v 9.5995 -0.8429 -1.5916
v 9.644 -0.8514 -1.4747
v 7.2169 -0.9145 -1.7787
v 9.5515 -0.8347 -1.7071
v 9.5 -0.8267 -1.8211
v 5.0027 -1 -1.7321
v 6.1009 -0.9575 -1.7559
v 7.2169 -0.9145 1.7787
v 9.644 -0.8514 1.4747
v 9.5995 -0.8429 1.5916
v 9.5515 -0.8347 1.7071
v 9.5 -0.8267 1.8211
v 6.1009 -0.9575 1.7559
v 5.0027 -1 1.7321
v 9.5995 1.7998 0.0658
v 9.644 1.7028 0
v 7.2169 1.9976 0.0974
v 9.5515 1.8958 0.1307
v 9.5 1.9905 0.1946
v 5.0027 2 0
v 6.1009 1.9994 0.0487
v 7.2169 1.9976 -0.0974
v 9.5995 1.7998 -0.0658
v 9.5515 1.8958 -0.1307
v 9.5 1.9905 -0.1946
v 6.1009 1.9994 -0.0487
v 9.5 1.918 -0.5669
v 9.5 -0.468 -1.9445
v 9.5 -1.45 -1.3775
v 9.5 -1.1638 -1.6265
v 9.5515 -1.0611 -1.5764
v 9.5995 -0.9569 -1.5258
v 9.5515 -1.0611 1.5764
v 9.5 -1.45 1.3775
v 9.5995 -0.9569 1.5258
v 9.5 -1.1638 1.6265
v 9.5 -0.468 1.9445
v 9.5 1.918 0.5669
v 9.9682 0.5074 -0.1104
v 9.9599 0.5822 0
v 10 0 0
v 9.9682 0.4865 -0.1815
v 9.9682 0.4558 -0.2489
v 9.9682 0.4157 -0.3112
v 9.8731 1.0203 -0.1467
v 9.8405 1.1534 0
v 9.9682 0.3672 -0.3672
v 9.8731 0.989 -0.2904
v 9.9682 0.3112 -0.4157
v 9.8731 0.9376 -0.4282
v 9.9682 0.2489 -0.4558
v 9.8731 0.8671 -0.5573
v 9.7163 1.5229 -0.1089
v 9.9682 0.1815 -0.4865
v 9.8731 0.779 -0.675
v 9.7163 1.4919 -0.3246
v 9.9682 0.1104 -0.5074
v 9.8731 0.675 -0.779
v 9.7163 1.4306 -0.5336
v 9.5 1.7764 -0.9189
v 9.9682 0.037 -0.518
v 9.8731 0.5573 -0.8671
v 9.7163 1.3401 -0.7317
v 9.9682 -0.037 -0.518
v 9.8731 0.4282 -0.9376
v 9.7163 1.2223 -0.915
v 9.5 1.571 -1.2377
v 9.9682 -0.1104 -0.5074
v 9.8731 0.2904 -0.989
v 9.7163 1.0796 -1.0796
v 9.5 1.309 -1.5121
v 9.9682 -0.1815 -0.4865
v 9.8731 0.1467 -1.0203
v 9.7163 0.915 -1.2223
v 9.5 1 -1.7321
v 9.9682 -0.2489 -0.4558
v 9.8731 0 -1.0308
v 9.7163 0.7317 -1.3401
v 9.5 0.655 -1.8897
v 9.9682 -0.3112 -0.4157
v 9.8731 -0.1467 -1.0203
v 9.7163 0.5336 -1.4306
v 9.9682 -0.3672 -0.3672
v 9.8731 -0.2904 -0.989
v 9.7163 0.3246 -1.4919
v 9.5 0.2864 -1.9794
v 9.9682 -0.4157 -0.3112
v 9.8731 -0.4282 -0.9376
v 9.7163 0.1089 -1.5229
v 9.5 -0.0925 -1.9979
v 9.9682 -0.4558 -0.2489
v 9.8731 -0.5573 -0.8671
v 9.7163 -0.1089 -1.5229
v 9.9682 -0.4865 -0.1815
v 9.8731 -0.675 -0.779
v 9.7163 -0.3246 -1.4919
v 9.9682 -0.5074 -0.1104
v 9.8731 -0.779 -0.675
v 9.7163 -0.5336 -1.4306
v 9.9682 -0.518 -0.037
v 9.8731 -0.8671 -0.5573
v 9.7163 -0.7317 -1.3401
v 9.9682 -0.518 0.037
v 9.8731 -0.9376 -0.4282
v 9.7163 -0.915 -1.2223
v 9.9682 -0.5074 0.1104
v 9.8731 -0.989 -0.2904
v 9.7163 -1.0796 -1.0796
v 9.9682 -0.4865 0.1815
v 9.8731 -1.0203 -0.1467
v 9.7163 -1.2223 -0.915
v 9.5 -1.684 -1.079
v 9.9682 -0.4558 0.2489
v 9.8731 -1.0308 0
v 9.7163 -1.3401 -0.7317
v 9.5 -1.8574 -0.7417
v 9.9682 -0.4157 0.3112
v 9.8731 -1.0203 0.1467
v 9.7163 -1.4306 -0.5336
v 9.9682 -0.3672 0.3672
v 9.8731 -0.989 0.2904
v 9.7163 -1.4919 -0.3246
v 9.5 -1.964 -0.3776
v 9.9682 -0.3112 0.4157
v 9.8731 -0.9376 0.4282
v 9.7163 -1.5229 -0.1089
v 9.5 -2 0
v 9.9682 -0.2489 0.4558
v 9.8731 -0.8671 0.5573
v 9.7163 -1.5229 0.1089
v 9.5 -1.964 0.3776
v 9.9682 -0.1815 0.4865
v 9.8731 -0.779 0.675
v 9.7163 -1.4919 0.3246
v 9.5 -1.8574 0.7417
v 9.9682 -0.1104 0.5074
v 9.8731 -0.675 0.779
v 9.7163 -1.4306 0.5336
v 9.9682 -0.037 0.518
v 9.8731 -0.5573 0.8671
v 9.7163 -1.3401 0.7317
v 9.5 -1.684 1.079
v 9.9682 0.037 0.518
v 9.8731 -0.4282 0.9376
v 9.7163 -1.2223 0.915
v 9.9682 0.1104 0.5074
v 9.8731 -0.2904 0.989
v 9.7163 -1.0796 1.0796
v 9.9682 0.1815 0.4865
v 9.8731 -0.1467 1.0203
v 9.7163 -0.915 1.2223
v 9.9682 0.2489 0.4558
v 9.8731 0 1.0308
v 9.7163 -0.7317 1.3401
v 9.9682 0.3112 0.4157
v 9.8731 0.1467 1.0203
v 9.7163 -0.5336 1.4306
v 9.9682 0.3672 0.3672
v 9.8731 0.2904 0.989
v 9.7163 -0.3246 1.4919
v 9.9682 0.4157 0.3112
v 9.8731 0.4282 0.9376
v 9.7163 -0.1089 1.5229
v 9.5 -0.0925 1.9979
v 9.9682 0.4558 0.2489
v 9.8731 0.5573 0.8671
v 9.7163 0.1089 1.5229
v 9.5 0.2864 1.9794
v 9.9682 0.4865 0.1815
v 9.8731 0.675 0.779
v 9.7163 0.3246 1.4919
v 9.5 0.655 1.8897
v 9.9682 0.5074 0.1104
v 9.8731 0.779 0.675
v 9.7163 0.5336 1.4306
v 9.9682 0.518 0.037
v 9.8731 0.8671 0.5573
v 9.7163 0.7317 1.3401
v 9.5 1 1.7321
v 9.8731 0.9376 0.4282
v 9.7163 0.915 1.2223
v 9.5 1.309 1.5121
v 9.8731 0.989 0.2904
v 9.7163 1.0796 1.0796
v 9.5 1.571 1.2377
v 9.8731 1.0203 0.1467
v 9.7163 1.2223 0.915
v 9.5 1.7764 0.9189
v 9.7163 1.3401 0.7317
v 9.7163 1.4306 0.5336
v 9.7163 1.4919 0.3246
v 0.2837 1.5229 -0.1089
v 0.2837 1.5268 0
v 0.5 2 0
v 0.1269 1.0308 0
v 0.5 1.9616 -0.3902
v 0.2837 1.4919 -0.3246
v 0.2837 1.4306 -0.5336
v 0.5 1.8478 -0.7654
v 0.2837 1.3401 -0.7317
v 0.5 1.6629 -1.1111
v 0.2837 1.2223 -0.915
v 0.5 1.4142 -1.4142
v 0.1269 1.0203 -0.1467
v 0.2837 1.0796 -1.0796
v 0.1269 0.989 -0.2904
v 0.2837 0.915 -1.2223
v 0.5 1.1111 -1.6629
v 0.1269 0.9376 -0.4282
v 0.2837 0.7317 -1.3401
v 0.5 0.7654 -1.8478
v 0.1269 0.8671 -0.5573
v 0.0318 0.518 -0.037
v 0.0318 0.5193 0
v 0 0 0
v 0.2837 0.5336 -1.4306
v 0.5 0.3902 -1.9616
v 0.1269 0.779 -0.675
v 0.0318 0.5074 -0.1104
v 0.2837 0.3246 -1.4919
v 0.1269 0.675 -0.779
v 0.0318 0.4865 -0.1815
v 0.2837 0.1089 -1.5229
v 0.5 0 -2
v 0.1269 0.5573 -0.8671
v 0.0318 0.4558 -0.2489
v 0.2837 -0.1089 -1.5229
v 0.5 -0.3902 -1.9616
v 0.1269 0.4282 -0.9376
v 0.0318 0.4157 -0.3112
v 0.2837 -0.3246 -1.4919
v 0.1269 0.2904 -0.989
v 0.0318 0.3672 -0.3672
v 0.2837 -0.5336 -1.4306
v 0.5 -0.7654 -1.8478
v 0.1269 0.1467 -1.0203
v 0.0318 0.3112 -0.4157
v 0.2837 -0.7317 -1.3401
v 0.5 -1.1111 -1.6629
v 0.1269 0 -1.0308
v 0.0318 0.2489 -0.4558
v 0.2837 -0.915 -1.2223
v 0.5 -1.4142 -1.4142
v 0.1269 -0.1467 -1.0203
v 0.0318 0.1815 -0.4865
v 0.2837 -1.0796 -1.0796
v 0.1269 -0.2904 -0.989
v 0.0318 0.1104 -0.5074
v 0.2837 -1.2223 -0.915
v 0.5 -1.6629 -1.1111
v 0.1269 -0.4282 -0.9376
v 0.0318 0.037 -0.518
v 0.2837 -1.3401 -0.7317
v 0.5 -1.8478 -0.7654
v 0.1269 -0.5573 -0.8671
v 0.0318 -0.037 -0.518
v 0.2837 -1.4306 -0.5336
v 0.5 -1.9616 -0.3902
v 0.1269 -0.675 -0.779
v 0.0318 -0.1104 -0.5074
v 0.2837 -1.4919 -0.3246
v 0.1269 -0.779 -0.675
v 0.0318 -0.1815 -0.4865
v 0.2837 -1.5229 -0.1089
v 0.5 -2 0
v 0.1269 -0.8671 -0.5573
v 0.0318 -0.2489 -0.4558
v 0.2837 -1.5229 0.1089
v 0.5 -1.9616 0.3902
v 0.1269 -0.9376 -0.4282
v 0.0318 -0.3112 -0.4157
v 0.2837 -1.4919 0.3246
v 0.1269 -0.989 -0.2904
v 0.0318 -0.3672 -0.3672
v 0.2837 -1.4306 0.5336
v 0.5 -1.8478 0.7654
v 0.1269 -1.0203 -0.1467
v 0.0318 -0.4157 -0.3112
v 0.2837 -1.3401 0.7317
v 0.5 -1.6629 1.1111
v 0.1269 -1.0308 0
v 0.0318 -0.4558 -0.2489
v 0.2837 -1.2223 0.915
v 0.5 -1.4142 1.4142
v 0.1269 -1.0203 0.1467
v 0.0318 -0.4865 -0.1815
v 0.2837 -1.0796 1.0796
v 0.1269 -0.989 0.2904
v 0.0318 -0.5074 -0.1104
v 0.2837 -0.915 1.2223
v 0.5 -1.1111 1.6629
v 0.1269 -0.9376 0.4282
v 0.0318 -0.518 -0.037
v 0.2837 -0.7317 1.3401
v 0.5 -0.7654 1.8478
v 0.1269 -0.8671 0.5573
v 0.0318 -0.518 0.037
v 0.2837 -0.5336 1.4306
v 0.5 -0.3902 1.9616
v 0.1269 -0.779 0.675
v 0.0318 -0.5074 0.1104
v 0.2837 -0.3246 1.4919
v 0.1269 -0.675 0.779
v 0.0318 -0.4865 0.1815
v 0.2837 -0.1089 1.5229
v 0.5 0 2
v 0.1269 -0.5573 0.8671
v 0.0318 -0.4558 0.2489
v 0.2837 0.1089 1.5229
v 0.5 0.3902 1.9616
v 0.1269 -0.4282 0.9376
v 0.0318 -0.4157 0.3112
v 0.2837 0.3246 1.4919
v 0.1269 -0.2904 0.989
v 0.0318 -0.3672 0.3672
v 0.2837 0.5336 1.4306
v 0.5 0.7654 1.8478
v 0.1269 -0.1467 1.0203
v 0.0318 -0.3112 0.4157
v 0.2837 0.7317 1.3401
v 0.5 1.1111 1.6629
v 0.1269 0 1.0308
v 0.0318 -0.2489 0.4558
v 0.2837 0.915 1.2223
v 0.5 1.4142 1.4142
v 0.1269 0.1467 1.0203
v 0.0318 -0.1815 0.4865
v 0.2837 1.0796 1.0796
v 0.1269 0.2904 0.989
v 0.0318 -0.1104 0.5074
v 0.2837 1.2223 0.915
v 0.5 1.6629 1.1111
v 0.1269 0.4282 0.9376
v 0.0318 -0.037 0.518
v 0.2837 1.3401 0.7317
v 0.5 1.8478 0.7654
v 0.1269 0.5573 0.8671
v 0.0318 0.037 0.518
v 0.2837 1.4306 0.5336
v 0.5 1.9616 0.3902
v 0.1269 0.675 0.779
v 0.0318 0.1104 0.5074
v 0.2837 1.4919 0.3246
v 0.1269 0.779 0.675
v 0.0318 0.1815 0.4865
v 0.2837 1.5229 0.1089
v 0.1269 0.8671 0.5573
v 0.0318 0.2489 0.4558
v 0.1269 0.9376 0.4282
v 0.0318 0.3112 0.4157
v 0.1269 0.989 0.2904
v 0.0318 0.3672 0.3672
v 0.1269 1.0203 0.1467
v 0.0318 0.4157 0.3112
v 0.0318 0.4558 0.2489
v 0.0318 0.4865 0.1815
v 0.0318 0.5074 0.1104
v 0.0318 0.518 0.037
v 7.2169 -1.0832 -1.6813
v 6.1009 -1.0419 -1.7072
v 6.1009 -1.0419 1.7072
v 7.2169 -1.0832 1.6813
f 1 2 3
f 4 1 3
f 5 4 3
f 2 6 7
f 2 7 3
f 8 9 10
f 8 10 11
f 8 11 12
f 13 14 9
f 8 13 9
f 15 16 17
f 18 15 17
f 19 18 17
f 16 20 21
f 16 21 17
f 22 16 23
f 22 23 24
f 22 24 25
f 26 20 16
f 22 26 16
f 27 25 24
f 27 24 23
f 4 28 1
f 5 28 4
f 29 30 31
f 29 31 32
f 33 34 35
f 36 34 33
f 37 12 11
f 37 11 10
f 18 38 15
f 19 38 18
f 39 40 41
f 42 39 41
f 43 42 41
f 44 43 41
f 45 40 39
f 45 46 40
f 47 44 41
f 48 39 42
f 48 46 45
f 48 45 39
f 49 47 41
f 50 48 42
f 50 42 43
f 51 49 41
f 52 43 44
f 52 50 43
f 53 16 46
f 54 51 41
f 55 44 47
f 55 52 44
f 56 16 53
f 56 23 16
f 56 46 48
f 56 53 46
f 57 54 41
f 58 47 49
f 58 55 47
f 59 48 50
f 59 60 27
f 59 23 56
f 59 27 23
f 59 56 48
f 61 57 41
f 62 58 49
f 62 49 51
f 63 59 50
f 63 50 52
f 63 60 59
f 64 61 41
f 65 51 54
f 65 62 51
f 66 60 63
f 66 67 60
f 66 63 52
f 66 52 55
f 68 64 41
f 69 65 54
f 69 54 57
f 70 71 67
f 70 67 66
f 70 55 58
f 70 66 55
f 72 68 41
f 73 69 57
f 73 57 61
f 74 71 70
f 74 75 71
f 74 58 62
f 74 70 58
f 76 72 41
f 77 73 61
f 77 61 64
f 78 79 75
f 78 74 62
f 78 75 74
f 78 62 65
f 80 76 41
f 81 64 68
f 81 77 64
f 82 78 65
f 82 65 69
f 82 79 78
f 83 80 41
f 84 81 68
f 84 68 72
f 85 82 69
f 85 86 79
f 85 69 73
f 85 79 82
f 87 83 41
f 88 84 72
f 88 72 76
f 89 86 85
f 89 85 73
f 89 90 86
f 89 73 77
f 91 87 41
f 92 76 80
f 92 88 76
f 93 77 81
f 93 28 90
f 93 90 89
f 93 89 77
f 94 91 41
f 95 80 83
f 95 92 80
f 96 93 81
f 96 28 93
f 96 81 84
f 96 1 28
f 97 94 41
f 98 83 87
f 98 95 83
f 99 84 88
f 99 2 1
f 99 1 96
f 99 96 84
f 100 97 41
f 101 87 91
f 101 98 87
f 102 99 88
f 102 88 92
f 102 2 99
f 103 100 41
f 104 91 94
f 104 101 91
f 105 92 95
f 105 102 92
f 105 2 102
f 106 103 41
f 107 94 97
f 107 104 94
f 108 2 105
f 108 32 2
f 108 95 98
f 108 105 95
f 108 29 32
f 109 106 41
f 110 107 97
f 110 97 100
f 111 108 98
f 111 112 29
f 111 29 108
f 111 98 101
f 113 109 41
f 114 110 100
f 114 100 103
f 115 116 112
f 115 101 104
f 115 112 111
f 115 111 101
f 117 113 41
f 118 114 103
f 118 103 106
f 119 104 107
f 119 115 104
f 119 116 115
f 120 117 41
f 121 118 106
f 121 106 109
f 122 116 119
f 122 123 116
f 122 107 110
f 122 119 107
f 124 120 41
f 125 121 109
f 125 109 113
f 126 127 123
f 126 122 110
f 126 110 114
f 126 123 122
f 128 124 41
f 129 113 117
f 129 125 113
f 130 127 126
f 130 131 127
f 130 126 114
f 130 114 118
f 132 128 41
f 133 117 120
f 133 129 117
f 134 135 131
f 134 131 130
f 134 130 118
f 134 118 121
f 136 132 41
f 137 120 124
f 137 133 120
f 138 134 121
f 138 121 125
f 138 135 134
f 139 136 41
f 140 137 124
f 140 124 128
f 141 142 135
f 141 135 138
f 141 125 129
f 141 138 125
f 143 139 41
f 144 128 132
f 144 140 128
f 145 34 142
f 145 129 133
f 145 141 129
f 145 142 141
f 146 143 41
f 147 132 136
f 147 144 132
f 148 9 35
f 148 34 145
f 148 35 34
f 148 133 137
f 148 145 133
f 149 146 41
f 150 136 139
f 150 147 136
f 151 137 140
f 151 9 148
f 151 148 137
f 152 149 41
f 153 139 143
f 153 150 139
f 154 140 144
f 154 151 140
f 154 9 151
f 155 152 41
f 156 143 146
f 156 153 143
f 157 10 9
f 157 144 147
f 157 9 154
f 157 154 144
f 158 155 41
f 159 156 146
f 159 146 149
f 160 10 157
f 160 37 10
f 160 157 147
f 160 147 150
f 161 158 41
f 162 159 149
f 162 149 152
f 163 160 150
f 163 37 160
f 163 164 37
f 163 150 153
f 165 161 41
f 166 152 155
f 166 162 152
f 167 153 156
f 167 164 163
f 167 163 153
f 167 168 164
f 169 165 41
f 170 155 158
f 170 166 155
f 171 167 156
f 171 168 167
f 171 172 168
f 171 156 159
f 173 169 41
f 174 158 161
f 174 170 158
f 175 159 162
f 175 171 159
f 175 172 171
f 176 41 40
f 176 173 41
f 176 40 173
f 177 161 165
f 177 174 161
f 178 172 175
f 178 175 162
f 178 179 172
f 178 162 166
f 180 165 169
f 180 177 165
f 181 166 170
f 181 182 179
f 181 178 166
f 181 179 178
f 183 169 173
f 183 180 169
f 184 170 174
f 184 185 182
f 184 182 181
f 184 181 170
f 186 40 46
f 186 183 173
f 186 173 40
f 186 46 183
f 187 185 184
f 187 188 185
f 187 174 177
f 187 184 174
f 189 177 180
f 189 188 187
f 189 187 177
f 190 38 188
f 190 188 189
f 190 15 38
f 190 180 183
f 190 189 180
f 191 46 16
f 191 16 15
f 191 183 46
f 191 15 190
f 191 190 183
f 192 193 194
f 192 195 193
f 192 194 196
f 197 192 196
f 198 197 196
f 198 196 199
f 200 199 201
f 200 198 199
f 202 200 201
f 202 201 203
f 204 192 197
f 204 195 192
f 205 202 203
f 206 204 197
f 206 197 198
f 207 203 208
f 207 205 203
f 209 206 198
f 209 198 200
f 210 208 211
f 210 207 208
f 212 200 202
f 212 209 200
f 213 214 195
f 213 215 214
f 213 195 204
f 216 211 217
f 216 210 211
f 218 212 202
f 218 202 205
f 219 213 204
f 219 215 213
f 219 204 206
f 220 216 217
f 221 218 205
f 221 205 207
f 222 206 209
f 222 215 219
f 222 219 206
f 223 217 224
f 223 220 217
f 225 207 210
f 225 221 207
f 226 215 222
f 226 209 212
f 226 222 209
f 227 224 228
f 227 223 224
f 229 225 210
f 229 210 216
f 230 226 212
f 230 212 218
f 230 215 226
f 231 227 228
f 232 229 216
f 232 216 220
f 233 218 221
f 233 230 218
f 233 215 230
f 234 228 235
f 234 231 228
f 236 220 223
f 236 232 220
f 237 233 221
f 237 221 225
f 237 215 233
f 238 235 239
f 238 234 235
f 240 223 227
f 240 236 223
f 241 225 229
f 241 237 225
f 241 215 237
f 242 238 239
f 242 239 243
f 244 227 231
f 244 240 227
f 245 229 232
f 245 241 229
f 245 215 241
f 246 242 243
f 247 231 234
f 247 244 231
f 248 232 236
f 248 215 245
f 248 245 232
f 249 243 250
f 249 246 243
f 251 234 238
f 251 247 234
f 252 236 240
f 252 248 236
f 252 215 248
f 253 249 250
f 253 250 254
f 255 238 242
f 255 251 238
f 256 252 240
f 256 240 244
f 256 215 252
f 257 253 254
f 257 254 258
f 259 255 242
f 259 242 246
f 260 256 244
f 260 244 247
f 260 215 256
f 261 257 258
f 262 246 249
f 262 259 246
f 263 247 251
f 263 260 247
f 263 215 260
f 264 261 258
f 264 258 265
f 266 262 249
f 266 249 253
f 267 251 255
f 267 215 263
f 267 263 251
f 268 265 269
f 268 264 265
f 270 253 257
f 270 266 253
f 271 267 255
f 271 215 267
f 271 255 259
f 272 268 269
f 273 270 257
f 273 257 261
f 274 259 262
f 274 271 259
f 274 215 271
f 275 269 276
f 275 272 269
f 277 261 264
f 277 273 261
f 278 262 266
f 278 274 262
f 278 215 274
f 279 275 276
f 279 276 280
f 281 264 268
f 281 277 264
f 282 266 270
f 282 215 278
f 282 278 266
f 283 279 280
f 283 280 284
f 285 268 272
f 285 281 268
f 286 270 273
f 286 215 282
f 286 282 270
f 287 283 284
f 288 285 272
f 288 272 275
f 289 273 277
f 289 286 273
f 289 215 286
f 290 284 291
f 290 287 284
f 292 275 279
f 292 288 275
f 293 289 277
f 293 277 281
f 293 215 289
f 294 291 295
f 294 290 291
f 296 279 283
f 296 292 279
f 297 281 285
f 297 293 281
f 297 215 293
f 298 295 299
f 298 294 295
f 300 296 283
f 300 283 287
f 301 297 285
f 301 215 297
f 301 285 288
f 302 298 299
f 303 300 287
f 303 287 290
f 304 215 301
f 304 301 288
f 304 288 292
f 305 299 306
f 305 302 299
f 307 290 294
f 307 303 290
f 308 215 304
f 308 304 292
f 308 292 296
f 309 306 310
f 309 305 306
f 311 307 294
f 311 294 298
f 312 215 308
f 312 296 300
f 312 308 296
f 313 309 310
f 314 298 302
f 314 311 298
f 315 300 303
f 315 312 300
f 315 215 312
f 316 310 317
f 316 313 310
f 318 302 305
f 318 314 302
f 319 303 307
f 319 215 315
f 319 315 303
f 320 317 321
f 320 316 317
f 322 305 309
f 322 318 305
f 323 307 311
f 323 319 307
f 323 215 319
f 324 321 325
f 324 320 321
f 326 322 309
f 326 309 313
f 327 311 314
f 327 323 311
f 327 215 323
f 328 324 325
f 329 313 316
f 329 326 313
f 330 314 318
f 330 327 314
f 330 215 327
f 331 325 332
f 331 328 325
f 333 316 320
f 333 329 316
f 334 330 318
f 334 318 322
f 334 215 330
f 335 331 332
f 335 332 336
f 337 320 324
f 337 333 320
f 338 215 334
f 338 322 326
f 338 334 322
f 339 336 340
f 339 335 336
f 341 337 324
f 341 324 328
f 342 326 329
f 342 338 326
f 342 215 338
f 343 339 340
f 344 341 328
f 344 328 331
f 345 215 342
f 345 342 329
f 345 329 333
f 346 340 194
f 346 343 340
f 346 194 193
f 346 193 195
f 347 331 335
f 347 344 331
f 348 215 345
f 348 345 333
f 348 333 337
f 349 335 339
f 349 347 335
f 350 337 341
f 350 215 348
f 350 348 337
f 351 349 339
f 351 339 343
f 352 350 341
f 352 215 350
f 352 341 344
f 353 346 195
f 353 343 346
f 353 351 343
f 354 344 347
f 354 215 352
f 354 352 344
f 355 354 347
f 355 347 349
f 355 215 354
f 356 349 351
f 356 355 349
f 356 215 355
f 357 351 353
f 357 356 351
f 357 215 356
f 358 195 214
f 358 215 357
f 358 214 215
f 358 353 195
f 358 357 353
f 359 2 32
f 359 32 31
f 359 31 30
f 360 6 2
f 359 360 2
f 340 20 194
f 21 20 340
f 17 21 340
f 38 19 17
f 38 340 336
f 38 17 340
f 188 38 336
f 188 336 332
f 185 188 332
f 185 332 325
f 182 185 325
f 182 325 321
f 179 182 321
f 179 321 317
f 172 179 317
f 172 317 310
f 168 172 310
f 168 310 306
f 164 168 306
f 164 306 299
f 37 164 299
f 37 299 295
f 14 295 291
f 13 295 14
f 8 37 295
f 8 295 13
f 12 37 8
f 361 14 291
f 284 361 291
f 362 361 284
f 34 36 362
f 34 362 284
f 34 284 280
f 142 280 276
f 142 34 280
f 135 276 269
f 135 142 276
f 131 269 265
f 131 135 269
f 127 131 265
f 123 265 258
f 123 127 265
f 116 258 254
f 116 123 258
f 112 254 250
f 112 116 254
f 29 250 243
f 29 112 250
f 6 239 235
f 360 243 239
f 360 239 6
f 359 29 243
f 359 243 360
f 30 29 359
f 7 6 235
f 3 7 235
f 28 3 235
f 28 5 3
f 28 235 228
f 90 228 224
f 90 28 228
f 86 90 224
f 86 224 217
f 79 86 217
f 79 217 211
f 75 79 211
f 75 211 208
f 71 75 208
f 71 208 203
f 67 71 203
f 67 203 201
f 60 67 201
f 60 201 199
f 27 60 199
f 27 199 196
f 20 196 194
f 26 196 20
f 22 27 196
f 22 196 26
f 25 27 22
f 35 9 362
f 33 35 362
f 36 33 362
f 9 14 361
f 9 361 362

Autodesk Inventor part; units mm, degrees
ref_plane "YZ Plane" through (0, 0, 0) normal (1, 0, 0) x (0, 1, 0)
sketch "Skizze1" plane through (0, 0, 0) normal (0, 0, 1) x (1, 0, 0)
  line L0 (0, 0) -> (10, 0)
  line L1 (0.5, 2) -> (9.5, 2)
  arc A0 (0.5, 2) -> (0, 0) centre (4.25, 0) ccw
  arc A1 (10, 0) -> (9.5, 2) centre (5.75, 0) ccw
  line L2 (10, 0) -> (10, 1.68) construction
  line L3 (10, 1.68) -> (5, 2) construction
  line L4 (-12.8617, 0) -> (72.8617, 0) projected
  line L5 (0, 12.1847) -> (0, -2.0308) projected
  point P0 (5, 0)
  dimension "d0" = 4
  dimension "d1" = 10
  dimension "d2" = 3.36
  dimension "d12" = 5
  dimension "d17" = 0.5
  dimension "d18" = 0.5
revolve "Körper" add sketch "Skizze1" angle 360 about axis through (0, 0, 0) along (1, 0, 0)
ref_plane "Work Plane1" through (10, 0, 0) normal (1, 0, 0) x (0, 1, 0)
sketch "Skizze2" plane through (10, 0, 0) normal (1, 0, 0) x (0, 1, 0)
  line L0 (0, -14) -> (0, 14) projected
ref_plane "Work Plane2" through (10, 0, -10) normal (0.998, -0.0639, 0) x (0.0639, 0.998, 0)
sketch "Skizze3" plane through (10, 0, -10) normal (0.998, -0.0639, 0) x (0.0639, 0.998, 0)
  ellipse E0 centre (-0.0319, 10) end of major axis (-0.0319, 12) minor radius 1.9959 projected
  line L0 (-0.3193, 10) -> (1.6766, 10) projected
  line L1 (1.6766, 10) -> (1.9545, 10.1946)
  line L2 (1.6766, 10) -> (1.9545, 9.8054)
  arc A0 (1.9545, 9.8054) -> (1.9545, 10.1946) centre (-0.0319, 10) ccw
  dimension "d7" = 70
extrude "Nut" cut sketch "Skizze3" against normal up to next contours L2 L1 E0 picked at (1.8643, 10.0973)
pattern_circular "Nuten" count 3 over 360 about axis through (5, 0, 0) along (1, 0, 0) of "Nut"
equation "\"d0\" = NND"
equation "\"d1\" = NLG"
equation "\"d2\" = 0.84 * NND"
equation "\"d17\" = KAH"
equation "\"d18\" = KAH"
equation "\"d8\" = 0.5 * NLG"
equation "\"NND\" = 4"
equation "\"NLG\" = 10"
equation "\"KAH\" = 0.5"
equation "\"d6\" = -d5"
equation "\"FAC\" = 0.5"
equation "\"NND1\" = 4.25"
equation "\"NLG1\" = 9"
properties part number "ISO 8745 - 4 x 10" material "Edelstahl, austenitisch"
